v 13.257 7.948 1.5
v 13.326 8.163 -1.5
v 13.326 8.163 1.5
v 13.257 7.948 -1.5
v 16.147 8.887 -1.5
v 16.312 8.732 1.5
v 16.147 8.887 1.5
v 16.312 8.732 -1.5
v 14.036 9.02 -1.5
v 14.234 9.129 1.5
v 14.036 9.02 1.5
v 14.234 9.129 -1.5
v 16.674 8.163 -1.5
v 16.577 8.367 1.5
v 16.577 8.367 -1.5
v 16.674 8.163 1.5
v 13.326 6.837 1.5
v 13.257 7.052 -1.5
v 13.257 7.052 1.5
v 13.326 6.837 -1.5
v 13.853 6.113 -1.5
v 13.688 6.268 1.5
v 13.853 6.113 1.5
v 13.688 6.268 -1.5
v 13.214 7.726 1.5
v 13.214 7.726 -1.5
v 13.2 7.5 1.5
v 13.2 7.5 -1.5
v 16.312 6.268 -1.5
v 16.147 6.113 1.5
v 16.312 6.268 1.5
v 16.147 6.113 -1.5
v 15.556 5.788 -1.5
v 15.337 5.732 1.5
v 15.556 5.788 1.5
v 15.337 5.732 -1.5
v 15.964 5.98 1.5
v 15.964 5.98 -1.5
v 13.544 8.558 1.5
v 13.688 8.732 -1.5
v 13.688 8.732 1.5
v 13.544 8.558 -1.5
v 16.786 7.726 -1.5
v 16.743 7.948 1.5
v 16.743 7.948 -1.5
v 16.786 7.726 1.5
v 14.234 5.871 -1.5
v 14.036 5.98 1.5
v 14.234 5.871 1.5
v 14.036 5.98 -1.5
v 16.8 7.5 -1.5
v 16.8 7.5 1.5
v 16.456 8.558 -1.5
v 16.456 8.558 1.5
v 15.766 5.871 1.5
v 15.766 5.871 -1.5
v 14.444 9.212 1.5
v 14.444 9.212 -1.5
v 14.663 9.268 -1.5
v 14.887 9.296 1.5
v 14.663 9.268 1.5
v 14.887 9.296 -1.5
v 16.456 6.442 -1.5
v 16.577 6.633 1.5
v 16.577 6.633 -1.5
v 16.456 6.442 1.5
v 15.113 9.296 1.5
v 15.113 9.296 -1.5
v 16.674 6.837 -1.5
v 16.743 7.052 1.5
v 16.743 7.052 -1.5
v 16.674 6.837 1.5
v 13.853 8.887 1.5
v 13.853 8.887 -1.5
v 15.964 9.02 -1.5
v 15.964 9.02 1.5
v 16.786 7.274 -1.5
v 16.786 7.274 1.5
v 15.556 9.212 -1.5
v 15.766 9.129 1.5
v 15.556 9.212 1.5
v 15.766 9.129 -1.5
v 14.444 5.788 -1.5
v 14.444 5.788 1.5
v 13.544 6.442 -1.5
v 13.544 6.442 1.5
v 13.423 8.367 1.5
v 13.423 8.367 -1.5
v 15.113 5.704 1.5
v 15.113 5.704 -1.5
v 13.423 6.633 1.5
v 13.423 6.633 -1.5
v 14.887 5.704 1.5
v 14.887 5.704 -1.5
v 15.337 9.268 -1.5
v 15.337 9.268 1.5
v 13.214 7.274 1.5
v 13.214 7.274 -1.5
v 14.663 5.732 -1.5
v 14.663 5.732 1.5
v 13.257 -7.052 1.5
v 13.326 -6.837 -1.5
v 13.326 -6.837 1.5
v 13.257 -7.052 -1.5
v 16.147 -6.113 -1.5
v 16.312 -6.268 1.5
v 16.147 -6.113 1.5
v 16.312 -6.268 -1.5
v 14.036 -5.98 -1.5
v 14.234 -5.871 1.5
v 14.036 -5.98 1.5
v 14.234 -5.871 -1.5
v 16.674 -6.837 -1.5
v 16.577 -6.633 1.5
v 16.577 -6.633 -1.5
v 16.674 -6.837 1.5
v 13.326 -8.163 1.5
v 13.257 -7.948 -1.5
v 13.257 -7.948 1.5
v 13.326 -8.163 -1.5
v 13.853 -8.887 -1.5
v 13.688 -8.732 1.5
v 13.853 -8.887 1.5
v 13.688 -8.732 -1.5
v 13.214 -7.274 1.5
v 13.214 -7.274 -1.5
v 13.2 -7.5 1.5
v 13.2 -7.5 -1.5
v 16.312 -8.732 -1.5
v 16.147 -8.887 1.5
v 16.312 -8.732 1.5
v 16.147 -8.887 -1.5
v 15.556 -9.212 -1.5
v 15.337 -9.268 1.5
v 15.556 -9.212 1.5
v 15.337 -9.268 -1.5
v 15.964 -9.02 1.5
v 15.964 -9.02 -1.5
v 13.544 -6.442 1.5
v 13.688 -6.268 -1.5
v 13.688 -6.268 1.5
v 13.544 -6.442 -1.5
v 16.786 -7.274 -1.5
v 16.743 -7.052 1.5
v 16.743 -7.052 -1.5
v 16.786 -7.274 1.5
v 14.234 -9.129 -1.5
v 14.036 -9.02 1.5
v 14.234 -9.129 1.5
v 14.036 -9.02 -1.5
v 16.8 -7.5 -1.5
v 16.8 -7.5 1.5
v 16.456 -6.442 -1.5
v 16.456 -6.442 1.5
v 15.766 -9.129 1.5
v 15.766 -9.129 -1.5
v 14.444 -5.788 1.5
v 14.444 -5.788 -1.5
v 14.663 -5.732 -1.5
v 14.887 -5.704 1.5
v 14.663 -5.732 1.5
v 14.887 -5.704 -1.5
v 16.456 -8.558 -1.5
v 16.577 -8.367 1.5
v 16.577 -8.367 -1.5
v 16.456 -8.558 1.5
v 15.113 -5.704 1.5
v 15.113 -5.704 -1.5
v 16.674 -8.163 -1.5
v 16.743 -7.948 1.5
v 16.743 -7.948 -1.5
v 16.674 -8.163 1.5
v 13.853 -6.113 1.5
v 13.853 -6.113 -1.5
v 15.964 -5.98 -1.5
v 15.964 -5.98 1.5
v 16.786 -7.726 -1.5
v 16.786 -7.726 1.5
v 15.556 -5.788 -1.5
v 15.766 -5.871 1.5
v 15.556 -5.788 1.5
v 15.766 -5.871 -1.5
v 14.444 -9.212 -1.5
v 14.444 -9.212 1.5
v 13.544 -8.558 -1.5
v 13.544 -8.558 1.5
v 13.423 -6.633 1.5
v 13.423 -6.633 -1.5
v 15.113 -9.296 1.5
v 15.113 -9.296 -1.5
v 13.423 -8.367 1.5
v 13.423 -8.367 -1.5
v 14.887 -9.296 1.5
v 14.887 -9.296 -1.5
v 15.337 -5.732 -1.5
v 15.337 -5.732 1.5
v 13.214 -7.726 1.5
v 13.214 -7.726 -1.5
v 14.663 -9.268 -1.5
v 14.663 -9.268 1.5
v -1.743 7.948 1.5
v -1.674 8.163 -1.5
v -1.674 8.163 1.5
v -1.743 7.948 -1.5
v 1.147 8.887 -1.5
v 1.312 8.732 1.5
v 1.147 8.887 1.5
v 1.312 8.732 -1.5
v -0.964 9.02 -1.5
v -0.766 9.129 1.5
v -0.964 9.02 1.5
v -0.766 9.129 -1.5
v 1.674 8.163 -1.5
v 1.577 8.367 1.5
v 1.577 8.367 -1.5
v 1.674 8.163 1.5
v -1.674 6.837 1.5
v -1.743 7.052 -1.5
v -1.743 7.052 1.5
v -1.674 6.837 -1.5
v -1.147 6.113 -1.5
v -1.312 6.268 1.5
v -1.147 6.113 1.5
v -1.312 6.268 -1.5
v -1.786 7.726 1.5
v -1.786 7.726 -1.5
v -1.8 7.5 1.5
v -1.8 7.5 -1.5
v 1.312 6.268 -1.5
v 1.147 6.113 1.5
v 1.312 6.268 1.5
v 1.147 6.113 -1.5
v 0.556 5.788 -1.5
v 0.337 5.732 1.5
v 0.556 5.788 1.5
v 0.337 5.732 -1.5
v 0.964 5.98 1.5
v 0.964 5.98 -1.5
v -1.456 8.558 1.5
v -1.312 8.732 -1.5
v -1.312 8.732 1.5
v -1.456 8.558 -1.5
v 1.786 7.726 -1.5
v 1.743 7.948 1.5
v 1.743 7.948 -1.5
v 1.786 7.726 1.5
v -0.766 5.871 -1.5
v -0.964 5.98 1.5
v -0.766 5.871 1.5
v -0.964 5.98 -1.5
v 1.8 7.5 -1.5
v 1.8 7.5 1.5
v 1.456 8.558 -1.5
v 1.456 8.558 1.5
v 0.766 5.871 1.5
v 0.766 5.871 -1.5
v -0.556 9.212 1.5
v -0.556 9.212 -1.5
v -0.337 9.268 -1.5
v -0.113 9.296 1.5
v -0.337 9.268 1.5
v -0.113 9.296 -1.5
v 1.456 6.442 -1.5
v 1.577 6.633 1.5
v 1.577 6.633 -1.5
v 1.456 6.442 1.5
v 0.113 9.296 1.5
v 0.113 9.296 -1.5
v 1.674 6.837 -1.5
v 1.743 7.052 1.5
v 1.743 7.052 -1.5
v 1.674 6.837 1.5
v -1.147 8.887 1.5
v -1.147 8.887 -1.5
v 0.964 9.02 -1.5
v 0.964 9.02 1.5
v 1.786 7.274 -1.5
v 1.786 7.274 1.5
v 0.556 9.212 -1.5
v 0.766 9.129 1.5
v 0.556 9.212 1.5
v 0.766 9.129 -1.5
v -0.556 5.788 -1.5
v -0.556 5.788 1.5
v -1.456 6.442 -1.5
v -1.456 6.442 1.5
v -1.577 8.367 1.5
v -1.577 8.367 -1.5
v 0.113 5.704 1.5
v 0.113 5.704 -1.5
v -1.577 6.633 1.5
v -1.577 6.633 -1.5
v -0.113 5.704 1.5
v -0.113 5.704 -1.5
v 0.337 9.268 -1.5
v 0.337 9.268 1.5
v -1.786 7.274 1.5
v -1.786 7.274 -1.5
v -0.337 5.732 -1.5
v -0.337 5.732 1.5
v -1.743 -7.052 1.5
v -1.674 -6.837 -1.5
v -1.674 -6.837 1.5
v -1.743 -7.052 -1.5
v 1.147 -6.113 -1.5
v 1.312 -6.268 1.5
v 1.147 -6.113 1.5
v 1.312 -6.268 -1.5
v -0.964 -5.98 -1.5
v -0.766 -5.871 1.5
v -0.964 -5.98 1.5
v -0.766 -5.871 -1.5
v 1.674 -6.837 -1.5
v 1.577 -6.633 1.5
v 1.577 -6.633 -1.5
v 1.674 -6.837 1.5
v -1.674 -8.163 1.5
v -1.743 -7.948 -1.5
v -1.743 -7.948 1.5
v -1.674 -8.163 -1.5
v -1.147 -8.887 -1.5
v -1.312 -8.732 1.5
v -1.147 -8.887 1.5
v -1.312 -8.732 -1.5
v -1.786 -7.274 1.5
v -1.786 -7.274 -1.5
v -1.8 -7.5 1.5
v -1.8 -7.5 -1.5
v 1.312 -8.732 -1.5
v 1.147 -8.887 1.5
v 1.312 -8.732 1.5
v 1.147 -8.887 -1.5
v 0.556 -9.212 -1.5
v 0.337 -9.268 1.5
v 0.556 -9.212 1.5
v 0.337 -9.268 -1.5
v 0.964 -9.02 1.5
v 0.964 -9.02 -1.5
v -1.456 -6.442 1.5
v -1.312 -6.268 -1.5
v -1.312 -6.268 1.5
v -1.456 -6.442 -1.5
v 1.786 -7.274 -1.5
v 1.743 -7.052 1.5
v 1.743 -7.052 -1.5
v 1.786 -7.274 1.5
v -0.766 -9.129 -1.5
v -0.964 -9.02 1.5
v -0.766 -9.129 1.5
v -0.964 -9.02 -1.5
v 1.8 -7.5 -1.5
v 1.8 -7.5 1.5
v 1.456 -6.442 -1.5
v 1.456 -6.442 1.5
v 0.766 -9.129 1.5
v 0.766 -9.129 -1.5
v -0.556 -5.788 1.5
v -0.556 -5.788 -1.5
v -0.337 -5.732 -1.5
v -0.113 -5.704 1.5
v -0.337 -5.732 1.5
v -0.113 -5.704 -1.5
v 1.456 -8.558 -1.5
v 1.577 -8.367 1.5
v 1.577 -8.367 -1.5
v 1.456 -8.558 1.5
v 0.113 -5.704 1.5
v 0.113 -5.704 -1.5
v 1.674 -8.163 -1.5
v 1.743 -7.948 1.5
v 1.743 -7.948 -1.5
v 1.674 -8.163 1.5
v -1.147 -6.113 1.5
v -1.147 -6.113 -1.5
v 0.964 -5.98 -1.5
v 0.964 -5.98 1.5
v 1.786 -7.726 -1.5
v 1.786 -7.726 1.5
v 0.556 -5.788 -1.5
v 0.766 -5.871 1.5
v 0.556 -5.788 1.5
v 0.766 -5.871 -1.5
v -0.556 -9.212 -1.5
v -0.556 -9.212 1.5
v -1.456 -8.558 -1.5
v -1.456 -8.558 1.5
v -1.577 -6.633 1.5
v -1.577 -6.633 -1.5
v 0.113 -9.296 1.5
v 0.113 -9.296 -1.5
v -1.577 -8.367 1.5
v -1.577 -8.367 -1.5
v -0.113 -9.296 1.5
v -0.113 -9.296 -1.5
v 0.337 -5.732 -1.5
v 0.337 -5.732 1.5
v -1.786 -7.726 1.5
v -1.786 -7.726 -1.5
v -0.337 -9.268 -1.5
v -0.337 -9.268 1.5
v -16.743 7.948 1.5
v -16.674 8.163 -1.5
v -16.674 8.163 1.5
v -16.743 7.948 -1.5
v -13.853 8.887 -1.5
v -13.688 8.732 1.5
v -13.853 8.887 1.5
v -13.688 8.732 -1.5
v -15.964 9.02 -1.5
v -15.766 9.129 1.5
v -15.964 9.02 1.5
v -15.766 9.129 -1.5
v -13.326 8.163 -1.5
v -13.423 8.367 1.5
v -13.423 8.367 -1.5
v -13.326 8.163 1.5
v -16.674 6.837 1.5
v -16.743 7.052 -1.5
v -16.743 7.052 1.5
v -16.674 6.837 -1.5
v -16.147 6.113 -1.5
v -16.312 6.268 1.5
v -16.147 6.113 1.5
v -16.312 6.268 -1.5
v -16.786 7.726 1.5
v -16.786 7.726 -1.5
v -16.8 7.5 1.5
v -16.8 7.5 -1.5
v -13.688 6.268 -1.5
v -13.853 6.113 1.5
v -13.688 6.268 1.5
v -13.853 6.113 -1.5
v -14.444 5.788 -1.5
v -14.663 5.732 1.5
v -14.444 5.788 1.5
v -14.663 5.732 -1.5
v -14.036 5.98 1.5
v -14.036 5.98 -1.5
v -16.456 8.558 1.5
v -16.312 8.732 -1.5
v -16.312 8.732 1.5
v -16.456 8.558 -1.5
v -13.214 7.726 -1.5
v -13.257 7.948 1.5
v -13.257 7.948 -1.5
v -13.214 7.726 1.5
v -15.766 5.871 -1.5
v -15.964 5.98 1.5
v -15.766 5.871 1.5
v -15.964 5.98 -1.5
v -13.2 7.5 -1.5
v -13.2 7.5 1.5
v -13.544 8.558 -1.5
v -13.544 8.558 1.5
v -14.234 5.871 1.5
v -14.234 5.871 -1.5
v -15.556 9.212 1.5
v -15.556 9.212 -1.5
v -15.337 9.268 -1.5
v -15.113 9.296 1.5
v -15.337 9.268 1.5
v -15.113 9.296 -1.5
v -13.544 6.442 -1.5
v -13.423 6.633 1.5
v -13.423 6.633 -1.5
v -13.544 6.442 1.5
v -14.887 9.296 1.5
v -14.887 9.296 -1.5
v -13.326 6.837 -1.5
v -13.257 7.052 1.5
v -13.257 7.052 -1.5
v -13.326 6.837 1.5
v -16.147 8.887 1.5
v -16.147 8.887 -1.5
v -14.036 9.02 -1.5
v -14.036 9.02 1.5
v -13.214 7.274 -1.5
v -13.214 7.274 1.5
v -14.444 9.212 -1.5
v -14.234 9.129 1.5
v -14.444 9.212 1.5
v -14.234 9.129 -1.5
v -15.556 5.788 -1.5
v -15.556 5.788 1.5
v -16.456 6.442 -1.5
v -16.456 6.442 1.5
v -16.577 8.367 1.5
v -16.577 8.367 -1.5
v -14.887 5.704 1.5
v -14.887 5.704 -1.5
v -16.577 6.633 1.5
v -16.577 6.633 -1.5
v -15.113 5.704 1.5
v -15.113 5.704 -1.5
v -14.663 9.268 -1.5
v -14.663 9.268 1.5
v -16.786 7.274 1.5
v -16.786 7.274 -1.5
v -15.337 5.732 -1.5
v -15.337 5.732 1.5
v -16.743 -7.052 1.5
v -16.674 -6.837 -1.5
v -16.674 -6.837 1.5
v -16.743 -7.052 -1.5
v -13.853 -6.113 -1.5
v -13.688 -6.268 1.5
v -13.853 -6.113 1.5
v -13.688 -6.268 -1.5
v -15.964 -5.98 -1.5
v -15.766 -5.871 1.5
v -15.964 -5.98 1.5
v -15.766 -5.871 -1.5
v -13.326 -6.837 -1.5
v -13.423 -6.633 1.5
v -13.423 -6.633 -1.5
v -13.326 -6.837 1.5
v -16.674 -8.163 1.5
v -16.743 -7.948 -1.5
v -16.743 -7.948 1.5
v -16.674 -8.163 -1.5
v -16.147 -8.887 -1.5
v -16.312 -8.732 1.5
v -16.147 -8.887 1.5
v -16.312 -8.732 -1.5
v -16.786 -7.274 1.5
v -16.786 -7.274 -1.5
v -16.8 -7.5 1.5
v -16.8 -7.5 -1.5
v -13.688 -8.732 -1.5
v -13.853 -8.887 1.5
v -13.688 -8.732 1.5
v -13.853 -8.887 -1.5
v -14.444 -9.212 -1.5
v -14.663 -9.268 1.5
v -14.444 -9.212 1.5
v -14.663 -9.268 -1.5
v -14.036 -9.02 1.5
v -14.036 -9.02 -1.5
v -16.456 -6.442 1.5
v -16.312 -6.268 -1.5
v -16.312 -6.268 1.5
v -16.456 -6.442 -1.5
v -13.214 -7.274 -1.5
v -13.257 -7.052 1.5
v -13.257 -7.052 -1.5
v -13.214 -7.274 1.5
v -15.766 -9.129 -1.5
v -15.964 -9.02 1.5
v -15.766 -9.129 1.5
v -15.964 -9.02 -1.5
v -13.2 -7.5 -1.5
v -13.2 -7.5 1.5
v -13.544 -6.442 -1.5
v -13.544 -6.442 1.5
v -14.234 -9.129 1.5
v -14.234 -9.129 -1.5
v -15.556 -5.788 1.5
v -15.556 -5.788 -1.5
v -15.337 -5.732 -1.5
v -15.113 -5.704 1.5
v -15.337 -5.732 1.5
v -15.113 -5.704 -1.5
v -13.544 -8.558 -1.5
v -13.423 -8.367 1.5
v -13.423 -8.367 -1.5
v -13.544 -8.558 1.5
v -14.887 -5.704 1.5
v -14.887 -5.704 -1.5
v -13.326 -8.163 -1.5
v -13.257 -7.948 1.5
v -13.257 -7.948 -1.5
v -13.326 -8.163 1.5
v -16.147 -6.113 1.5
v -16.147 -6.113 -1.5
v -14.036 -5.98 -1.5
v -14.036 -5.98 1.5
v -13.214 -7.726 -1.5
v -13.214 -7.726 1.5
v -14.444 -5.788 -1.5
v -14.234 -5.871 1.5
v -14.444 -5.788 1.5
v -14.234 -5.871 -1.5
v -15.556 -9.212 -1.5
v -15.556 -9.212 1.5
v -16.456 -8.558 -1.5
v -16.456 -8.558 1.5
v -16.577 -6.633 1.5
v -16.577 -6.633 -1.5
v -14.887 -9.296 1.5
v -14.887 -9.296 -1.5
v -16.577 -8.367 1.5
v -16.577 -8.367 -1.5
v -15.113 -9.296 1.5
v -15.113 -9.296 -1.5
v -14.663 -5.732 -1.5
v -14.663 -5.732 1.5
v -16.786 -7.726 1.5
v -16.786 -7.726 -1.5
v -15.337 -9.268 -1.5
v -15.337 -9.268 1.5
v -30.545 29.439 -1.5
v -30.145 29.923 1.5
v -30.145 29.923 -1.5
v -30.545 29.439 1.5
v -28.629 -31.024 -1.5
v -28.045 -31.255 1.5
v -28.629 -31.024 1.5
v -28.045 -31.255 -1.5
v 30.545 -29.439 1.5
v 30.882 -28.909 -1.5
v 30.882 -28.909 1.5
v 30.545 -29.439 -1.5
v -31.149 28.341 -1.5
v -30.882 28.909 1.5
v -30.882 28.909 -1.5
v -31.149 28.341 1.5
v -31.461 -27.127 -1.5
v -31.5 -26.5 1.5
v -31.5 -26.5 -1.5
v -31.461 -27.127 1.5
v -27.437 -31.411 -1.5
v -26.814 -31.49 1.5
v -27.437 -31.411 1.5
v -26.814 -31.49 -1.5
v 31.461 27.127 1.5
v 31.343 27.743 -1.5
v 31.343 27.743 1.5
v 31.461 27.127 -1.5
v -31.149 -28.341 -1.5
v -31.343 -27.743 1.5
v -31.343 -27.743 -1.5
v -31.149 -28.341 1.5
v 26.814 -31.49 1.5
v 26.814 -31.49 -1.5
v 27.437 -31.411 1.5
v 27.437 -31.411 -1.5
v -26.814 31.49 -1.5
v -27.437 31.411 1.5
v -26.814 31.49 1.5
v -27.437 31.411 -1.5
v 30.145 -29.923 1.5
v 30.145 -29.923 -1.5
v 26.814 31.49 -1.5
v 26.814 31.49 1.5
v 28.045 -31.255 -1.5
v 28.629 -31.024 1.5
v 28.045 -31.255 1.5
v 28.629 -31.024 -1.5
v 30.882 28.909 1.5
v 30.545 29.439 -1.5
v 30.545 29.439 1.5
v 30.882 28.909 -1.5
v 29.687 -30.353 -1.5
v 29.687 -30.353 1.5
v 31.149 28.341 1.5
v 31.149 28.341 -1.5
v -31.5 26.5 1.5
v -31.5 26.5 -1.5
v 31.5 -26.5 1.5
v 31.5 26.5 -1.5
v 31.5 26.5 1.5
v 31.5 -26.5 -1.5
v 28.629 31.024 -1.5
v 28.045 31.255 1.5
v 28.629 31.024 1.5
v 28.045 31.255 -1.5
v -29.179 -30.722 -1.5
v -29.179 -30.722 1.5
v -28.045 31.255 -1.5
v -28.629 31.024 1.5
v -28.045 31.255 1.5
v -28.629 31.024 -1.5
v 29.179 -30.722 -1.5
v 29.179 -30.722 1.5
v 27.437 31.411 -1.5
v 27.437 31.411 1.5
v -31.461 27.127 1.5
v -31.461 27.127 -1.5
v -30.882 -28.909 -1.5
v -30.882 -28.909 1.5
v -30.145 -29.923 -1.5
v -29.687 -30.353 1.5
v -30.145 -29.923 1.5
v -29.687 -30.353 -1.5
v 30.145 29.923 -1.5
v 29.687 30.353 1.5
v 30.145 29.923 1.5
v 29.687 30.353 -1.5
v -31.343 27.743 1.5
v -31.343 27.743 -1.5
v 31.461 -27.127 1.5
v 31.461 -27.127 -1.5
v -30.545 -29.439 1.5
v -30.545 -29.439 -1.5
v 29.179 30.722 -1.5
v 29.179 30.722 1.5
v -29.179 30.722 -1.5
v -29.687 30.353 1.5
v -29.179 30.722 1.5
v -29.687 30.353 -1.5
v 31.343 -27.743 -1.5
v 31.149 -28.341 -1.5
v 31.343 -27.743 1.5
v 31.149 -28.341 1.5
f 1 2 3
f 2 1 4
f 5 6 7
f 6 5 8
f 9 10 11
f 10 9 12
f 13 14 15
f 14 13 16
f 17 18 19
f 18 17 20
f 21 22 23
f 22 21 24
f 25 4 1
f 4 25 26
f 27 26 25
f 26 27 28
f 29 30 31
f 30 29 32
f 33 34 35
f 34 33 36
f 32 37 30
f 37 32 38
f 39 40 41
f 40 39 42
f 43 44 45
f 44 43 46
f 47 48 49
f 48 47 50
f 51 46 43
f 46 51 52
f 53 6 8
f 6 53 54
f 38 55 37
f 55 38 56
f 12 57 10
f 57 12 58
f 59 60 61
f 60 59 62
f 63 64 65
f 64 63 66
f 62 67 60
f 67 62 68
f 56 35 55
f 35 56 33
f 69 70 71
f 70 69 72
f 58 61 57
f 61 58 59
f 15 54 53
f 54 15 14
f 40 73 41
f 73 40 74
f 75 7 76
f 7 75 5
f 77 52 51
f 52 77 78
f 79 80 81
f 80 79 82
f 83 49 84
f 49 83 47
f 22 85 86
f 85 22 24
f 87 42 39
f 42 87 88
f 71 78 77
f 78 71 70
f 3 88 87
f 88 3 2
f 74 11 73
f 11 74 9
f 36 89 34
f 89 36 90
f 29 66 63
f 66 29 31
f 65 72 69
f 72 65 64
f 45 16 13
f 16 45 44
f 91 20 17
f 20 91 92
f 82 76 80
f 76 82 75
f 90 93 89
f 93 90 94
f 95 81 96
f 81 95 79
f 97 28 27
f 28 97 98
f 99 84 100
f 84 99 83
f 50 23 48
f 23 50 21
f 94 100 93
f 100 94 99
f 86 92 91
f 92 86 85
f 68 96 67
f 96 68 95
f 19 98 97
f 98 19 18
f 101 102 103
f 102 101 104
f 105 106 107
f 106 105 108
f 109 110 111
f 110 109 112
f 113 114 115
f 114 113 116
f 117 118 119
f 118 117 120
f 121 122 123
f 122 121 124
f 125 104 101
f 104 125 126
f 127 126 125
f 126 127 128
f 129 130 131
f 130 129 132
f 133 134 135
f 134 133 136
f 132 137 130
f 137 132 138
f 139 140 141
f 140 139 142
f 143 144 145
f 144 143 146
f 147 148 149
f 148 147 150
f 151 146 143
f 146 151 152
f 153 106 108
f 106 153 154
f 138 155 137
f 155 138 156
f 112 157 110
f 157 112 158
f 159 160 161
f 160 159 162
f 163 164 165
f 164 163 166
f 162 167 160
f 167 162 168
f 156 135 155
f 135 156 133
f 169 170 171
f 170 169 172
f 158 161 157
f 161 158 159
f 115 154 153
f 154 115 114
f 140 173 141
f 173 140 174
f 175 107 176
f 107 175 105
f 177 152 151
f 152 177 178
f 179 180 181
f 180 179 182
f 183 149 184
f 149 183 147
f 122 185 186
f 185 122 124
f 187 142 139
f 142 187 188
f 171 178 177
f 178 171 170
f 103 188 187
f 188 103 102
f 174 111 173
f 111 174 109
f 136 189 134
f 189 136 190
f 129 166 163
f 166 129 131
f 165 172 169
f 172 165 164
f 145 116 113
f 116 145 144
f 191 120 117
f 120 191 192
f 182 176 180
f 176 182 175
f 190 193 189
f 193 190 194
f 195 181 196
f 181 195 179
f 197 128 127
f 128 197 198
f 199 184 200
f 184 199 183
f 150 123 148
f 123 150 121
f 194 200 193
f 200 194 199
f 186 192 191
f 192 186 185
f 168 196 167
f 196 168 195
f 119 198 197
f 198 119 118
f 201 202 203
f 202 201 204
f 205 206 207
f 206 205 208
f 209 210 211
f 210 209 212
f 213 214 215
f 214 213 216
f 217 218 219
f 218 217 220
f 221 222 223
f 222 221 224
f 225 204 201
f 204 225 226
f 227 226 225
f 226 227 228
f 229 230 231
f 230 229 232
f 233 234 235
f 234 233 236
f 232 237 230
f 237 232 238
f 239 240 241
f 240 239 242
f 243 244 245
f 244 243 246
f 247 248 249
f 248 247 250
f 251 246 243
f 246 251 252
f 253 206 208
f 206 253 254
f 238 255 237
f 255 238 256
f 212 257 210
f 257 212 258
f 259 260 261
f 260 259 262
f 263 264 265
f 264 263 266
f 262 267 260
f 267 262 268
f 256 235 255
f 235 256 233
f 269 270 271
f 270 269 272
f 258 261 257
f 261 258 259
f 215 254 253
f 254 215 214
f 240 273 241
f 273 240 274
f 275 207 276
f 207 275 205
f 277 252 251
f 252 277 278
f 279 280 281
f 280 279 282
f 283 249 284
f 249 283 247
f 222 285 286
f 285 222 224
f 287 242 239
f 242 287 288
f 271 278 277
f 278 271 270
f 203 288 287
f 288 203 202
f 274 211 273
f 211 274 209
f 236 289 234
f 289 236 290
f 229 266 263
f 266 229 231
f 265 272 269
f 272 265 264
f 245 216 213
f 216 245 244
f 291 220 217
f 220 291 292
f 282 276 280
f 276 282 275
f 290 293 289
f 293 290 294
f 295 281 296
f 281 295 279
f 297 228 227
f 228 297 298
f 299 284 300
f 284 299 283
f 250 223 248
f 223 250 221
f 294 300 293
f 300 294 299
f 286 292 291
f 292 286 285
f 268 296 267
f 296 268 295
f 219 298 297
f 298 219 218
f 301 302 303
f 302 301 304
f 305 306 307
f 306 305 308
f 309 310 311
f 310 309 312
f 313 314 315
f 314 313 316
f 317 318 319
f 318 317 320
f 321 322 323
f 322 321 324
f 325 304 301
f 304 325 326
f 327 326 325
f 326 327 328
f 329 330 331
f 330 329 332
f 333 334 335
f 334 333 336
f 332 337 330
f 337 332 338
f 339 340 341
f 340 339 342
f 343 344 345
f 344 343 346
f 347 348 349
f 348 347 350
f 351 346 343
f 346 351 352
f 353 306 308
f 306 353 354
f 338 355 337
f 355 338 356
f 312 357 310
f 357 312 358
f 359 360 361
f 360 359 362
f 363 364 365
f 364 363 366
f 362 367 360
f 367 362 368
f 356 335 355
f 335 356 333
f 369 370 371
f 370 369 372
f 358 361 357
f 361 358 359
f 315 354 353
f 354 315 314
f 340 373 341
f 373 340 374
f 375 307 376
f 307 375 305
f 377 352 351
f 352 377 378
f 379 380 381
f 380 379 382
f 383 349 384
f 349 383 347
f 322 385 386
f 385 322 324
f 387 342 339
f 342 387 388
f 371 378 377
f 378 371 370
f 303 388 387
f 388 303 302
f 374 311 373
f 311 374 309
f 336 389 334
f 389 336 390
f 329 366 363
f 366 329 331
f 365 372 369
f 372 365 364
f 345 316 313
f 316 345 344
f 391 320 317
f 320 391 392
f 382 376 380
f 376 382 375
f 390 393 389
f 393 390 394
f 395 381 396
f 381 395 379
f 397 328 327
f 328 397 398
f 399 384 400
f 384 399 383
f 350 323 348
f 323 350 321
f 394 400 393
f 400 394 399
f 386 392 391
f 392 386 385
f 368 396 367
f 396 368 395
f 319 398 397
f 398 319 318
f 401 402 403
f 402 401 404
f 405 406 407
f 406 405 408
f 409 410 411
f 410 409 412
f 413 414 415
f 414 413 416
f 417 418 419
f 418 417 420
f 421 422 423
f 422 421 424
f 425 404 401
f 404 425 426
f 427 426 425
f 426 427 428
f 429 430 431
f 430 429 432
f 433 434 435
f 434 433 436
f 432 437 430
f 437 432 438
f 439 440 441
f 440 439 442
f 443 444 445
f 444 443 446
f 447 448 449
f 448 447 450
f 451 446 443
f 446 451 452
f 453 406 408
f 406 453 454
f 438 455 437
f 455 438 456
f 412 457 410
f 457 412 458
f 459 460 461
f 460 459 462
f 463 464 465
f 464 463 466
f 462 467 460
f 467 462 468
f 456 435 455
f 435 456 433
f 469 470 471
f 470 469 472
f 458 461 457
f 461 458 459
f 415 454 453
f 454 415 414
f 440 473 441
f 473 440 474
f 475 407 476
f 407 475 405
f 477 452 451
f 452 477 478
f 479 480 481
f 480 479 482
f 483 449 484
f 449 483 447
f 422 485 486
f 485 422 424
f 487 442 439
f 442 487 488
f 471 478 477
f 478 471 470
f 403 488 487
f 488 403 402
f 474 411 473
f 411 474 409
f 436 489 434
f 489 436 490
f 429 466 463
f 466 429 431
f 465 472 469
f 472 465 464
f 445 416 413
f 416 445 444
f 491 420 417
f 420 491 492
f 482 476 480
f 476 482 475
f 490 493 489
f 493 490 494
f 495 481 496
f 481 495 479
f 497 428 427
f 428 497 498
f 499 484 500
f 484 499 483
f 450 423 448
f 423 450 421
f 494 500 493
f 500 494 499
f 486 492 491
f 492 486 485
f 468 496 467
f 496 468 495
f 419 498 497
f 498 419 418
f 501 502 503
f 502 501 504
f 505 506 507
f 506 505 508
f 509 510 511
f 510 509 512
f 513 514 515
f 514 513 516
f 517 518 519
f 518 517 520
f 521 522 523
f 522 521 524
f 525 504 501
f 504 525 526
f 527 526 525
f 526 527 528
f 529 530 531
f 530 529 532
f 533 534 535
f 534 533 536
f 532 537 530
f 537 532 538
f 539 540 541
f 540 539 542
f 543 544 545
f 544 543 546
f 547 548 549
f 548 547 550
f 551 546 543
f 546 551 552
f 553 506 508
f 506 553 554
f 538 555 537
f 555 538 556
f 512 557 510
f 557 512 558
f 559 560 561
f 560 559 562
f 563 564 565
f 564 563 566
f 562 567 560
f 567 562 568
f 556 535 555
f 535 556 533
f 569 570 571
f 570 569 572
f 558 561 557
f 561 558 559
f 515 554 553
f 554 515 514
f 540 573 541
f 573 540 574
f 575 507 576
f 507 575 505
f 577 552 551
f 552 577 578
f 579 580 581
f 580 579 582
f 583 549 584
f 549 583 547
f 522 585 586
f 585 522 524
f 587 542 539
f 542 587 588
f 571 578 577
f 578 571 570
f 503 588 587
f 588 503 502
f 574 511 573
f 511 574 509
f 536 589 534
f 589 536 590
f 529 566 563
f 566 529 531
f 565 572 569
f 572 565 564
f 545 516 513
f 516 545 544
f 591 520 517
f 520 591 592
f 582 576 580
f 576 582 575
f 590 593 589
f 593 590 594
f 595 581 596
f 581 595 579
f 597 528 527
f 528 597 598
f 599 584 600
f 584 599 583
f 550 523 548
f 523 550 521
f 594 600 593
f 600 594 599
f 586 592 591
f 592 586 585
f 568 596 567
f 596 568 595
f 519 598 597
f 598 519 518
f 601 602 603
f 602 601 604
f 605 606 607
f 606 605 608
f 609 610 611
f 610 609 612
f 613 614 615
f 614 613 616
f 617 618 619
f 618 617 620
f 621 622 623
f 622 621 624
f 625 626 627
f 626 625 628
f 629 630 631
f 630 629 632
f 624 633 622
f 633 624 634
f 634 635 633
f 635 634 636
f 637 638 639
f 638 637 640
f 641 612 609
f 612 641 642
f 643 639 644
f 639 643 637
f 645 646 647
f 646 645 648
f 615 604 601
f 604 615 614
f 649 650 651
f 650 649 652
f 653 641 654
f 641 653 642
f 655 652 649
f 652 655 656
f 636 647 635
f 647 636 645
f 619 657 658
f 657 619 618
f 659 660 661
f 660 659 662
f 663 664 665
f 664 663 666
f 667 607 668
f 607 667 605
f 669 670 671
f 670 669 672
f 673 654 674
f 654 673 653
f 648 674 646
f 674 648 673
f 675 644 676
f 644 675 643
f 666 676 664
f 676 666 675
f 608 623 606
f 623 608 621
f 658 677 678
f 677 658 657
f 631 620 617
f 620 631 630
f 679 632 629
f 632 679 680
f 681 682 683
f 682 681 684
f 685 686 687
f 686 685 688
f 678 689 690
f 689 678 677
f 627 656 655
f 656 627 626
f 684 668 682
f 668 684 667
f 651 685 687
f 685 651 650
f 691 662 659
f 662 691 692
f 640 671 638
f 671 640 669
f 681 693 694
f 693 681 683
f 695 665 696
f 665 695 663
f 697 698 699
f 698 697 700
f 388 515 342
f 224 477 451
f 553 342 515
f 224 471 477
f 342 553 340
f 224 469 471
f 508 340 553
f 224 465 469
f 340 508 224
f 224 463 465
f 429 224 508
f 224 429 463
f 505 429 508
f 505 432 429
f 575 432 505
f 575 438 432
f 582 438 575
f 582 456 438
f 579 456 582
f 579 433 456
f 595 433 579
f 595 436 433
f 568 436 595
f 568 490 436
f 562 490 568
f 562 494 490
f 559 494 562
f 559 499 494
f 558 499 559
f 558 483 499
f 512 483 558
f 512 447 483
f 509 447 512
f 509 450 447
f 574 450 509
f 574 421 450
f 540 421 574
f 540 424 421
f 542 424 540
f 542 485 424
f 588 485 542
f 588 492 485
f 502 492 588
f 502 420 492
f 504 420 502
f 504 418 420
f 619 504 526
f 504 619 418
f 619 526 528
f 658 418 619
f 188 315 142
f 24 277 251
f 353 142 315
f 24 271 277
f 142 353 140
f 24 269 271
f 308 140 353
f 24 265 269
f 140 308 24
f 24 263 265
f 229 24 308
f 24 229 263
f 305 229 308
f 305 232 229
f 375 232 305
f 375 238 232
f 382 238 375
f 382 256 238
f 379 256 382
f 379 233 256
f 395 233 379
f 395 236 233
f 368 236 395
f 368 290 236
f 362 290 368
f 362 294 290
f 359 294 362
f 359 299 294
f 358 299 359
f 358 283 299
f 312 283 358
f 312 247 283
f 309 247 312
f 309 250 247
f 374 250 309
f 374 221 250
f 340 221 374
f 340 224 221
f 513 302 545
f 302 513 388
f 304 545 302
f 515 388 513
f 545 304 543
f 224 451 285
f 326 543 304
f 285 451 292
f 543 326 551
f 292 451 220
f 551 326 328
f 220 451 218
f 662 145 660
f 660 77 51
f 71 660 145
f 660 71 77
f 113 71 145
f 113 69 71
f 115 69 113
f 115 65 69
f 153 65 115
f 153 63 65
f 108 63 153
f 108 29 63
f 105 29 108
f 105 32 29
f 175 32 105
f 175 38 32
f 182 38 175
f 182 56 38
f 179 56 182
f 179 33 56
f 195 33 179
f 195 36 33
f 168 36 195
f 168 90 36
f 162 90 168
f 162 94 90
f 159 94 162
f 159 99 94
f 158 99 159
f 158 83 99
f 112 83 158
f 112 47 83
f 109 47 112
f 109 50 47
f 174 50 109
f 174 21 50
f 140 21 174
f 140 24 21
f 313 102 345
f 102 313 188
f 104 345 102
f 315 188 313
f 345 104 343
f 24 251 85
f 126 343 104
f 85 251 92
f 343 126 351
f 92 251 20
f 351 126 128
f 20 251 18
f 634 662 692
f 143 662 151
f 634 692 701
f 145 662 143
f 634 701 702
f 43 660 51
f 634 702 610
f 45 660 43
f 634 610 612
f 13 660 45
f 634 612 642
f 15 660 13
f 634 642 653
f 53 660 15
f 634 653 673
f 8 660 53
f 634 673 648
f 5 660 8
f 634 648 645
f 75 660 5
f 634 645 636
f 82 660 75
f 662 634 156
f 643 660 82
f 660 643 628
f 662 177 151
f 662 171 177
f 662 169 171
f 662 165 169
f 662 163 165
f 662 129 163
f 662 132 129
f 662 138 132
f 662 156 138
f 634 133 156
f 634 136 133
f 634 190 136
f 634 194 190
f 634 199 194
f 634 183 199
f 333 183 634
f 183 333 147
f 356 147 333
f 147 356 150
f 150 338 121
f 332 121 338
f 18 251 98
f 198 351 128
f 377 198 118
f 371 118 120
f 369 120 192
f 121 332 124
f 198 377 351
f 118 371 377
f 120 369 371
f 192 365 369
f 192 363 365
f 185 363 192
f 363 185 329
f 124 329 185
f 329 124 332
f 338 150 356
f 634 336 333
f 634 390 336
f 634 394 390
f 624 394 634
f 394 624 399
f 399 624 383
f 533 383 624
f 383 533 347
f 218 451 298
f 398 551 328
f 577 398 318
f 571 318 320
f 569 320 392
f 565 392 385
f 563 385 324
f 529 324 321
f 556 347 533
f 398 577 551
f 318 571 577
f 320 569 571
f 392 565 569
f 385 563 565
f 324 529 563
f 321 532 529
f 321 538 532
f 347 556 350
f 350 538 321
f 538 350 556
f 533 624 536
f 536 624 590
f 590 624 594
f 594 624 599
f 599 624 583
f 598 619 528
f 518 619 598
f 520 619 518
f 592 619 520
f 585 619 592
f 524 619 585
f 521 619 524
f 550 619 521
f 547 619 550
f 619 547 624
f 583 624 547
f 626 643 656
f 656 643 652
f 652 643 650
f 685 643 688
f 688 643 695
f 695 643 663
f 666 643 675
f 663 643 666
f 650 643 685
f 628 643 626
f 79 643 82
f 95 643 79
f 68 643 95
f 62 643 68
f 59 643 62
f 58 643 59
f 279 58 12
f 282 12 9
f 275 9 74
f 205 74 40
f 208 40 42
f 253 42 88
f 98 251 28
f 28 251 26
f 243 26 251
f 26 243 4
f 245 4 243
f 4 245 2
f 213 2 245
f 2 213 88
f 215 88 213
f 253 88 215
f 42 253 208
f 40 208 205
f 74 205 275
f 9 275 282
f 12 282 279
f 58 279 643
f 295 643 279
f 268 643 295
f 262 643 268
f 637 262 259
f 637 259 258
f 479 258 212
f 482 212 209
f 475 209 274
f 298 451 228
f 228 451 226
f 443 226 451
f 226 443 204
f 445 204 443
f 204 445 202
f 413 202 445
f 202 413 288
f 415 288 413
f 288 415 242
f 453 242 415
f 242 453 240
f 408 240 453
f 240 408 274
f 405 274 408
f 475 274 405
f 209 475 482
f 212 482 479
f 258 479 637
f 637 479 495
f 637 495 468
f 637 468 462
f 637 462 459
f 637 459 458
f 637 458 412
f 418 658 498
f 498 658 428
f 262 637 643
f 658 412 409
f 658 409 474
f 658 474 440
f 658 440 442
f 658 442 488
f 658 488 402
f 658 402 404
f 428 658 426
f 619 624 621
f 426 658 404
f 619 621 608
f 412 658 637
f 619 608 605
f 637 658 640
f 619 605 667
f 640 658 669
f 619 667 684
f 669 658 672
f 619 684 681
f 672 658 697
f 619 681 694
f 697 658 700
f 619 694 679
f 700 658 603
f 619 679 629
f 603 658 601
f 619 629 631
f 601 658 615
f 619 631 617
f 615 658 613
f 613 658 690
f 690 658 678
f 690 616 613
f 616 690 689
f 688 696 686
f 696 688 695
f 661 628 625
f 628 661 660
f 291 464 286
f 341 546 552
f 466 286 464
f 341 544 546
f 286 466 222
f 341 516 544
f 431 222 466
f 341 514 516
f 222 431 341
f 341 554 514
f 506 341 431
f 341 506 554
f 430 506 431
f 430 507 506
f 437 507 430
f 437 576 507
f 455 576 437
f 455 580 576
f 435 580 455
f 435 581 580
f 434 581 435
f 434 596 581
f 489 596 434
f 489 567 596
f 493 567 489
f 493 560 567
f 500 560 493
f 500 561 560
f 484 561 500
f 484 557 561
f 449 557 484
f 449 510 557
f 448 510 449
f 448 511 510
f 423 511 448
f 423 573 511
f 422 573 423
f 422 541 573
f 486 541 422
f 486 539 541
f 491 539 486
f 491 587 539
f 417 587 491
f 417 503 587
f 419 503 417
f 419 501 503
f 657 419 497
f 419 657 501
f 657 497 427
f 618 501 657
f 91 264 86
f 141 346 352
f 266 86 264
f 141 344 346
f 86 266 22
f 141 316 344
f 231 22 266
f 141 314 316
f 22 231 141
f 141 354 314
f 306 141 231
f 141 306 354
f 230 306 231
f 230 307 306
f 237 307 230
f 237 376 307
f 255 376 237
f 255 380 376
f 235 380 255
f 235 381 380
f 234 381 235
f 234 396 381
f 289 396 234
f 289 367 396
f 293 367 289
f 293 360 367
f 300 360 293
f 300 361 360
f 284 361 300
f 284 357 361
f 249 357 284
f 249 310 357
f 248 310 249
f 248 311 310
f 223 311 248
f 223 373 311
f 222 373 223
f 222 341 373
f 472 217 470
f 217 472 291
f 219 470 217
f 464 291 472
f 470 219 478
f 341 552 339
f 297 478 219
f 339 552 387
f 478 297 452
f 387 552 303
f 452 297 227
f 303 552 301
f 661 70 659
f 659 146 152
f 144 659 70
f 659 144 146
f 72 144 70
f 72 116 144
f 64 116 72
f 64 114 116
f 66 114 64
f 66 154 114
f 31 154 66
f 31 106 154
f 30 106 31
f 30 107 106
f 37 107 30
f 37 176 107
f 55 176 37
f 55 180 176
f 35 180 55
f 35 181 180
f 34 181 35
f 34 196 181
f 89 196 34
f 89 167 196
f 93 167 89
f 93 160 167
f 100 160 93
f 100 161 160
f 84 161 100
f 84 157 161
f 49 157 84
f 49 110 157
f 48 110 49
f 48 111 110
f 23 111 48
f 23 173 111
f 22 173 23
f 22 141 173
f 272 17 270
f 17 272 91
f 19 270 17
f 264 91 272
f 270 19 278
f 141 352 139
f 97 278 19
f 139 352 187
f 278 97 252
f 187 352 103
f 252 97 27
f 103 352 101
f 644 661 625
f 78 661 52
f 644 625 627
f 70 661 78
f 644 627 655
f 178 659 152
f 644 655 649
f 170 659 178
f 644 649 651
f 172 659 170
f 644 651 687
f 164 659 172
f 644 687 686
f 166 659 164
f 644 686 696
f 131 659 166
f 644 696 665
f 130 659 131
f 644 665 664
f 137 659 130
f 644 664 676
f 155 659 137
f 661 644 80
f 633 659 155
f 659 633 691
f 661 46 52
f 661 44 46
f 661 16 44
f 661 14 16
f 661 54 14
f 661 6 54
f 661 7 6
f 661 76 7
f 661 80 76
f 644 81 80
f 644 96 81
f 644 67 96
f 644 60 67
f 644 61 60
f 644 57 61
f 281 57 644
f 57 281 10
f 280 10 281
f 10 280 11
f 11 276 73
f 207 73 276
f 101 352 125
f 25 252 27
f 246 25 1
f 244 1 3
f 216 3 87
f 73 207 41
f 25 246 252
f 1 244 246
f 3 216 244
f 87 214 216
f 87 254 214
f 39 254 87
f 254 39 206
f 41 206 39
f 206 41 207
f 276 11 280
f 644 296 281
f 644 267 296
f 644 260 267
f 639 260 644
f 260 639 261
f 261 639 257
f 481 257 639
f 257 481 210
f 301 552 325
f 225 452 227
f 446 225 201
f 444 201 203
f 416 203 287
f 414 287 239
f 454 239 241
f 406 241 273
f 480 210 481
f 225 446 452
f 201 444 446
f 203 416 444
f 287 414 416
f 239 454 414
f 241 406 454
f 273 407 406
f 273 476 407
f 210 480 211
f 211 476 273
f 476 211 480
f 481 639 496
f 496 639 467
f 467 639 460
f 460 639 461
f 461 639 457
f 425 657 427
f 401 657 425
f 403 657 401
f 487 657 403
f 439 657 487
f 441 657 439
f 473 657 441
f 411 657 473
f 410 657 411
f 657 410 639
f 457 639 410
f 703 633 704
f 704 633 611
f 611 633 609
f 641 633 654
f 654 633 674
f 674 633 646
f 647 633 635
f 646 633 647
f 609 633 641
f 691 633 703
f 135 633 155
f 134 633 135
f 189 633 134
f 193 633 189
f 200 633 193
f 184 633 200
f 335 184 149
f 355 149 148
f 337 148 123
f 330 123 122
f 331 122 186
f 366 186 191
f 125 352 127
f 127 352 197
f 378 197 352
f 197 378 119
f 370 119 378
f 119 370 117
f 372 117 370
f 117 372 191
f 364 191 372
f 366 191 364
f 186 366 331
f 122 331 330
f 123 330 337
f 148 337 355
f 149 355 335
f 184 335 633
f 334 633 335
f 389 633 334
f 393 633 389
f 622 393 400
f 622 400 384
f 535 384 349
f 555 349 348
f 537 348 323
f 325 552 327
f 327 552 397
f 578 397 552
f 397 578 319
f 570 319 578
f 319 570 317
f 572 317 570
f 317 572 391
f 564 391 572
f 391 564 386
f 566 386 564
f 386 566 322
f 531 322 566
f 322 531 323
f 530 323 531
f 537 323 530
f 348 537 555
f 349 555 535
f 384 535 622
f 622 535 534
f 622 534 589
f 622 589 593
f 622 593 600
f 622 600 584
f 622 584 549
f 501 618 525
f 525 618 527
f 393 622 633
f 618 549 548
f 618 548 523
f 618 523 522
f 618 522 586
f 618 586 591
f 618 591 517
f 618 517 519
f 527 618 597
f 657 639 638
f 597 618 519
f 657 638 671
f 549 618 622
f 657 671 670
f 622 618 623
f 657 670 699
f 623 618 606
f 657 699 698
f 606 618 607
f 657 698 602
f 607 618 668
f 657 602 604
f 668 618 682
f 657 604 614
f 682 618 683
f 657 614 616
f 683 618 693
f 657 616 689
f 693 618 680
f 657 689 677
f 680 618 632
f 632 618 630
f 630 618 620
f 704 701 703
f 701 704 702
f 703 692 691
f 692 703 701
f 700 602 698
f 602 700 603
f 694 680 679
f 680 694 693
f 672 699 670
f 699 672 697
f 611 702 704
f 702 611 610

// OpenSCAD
$fn = 50;


difference() {
	union() {
		translate(v = [0, 0, -1.5000000000]) {
			hull() {
				translate(v = [-26.5000000000, 26.5000000000, 0]) {
					cylinder(h = 3, r = 5);
				}
				translate(v = [26.5000000000, 26.5000000000, 0]) {
					cylinder(h = 3, r = 5);
				}
				translate(v = [-26.5000000000, -26.5000000000, 0]) {
					cylinder(h = 3, r = 5);
				}
				translate(v = [26.5000000000, -26.5000000000, 0]) {
					cylinder(h = 3, r = 5);
				}
			}
		}
	}
	union() {
		translate(v = [15, 7.5000000000, 0]) {
			rotate(a = [0, 0, 0]) {
				difference() {
					union() {
						translate(v = [0, 0, -50.0000000000]) {
							cylinder(h = 100, r = 1.8000000000);
						}
					}
					union();
				}
			}
		}
		translate(v = [15, -7.5000000000, 0]) {
			rotate(a = [0, 0, 0]) {
				difference() {
					union() {
						translate(v = [0, 0, -50.0000000000]) {
							cylinder(h = 100, r = 1.8000000000);
						}
					}
					union();
				}
			}
		}
		translate(v = [0, 7.5000000000, 0]) {
			rotate(a = [0, 0, 0]) {
				difference() {
					union() {
						translate(v = [0, 0, -50.0000000000]) {
							cylinder(h = 100, r = 1.8000000000);
						}
					}
					union();
				}
			}
		}
		translate(v = [0, -7.5000000000, 0]) {
			rotate(a = [0, 0, 0]) {
				difference() {
					union() {
						translate(v = [0, 0, -50.0000000000]) {
							cylinder(h = 100, r = 1.8000000000);
						}
					}
					union();
				}
			}
		}
		translate(v = [-15, 7.5000000000, 0]) {
			rotate(a = [0, 0, 0]) {
				difference() {
					union() {
						translate(v = [0, 0, -50.0000000000]) {
							cylinder(h = 100, r = 1.8000000000);
						}
					}
					union();
				}
			}
		}
		translate(v = [-15, -7.5000000000, 0]) {
			rotate(a = [0, 0, 0]) {
				difference() {
					union() {
						translate(v = [0, 0, -50.0000000000]) {
							cylinder(h = 100, r = 1.8000000000);
						}
					}
					union();
				}
			}
		}
	}
}
